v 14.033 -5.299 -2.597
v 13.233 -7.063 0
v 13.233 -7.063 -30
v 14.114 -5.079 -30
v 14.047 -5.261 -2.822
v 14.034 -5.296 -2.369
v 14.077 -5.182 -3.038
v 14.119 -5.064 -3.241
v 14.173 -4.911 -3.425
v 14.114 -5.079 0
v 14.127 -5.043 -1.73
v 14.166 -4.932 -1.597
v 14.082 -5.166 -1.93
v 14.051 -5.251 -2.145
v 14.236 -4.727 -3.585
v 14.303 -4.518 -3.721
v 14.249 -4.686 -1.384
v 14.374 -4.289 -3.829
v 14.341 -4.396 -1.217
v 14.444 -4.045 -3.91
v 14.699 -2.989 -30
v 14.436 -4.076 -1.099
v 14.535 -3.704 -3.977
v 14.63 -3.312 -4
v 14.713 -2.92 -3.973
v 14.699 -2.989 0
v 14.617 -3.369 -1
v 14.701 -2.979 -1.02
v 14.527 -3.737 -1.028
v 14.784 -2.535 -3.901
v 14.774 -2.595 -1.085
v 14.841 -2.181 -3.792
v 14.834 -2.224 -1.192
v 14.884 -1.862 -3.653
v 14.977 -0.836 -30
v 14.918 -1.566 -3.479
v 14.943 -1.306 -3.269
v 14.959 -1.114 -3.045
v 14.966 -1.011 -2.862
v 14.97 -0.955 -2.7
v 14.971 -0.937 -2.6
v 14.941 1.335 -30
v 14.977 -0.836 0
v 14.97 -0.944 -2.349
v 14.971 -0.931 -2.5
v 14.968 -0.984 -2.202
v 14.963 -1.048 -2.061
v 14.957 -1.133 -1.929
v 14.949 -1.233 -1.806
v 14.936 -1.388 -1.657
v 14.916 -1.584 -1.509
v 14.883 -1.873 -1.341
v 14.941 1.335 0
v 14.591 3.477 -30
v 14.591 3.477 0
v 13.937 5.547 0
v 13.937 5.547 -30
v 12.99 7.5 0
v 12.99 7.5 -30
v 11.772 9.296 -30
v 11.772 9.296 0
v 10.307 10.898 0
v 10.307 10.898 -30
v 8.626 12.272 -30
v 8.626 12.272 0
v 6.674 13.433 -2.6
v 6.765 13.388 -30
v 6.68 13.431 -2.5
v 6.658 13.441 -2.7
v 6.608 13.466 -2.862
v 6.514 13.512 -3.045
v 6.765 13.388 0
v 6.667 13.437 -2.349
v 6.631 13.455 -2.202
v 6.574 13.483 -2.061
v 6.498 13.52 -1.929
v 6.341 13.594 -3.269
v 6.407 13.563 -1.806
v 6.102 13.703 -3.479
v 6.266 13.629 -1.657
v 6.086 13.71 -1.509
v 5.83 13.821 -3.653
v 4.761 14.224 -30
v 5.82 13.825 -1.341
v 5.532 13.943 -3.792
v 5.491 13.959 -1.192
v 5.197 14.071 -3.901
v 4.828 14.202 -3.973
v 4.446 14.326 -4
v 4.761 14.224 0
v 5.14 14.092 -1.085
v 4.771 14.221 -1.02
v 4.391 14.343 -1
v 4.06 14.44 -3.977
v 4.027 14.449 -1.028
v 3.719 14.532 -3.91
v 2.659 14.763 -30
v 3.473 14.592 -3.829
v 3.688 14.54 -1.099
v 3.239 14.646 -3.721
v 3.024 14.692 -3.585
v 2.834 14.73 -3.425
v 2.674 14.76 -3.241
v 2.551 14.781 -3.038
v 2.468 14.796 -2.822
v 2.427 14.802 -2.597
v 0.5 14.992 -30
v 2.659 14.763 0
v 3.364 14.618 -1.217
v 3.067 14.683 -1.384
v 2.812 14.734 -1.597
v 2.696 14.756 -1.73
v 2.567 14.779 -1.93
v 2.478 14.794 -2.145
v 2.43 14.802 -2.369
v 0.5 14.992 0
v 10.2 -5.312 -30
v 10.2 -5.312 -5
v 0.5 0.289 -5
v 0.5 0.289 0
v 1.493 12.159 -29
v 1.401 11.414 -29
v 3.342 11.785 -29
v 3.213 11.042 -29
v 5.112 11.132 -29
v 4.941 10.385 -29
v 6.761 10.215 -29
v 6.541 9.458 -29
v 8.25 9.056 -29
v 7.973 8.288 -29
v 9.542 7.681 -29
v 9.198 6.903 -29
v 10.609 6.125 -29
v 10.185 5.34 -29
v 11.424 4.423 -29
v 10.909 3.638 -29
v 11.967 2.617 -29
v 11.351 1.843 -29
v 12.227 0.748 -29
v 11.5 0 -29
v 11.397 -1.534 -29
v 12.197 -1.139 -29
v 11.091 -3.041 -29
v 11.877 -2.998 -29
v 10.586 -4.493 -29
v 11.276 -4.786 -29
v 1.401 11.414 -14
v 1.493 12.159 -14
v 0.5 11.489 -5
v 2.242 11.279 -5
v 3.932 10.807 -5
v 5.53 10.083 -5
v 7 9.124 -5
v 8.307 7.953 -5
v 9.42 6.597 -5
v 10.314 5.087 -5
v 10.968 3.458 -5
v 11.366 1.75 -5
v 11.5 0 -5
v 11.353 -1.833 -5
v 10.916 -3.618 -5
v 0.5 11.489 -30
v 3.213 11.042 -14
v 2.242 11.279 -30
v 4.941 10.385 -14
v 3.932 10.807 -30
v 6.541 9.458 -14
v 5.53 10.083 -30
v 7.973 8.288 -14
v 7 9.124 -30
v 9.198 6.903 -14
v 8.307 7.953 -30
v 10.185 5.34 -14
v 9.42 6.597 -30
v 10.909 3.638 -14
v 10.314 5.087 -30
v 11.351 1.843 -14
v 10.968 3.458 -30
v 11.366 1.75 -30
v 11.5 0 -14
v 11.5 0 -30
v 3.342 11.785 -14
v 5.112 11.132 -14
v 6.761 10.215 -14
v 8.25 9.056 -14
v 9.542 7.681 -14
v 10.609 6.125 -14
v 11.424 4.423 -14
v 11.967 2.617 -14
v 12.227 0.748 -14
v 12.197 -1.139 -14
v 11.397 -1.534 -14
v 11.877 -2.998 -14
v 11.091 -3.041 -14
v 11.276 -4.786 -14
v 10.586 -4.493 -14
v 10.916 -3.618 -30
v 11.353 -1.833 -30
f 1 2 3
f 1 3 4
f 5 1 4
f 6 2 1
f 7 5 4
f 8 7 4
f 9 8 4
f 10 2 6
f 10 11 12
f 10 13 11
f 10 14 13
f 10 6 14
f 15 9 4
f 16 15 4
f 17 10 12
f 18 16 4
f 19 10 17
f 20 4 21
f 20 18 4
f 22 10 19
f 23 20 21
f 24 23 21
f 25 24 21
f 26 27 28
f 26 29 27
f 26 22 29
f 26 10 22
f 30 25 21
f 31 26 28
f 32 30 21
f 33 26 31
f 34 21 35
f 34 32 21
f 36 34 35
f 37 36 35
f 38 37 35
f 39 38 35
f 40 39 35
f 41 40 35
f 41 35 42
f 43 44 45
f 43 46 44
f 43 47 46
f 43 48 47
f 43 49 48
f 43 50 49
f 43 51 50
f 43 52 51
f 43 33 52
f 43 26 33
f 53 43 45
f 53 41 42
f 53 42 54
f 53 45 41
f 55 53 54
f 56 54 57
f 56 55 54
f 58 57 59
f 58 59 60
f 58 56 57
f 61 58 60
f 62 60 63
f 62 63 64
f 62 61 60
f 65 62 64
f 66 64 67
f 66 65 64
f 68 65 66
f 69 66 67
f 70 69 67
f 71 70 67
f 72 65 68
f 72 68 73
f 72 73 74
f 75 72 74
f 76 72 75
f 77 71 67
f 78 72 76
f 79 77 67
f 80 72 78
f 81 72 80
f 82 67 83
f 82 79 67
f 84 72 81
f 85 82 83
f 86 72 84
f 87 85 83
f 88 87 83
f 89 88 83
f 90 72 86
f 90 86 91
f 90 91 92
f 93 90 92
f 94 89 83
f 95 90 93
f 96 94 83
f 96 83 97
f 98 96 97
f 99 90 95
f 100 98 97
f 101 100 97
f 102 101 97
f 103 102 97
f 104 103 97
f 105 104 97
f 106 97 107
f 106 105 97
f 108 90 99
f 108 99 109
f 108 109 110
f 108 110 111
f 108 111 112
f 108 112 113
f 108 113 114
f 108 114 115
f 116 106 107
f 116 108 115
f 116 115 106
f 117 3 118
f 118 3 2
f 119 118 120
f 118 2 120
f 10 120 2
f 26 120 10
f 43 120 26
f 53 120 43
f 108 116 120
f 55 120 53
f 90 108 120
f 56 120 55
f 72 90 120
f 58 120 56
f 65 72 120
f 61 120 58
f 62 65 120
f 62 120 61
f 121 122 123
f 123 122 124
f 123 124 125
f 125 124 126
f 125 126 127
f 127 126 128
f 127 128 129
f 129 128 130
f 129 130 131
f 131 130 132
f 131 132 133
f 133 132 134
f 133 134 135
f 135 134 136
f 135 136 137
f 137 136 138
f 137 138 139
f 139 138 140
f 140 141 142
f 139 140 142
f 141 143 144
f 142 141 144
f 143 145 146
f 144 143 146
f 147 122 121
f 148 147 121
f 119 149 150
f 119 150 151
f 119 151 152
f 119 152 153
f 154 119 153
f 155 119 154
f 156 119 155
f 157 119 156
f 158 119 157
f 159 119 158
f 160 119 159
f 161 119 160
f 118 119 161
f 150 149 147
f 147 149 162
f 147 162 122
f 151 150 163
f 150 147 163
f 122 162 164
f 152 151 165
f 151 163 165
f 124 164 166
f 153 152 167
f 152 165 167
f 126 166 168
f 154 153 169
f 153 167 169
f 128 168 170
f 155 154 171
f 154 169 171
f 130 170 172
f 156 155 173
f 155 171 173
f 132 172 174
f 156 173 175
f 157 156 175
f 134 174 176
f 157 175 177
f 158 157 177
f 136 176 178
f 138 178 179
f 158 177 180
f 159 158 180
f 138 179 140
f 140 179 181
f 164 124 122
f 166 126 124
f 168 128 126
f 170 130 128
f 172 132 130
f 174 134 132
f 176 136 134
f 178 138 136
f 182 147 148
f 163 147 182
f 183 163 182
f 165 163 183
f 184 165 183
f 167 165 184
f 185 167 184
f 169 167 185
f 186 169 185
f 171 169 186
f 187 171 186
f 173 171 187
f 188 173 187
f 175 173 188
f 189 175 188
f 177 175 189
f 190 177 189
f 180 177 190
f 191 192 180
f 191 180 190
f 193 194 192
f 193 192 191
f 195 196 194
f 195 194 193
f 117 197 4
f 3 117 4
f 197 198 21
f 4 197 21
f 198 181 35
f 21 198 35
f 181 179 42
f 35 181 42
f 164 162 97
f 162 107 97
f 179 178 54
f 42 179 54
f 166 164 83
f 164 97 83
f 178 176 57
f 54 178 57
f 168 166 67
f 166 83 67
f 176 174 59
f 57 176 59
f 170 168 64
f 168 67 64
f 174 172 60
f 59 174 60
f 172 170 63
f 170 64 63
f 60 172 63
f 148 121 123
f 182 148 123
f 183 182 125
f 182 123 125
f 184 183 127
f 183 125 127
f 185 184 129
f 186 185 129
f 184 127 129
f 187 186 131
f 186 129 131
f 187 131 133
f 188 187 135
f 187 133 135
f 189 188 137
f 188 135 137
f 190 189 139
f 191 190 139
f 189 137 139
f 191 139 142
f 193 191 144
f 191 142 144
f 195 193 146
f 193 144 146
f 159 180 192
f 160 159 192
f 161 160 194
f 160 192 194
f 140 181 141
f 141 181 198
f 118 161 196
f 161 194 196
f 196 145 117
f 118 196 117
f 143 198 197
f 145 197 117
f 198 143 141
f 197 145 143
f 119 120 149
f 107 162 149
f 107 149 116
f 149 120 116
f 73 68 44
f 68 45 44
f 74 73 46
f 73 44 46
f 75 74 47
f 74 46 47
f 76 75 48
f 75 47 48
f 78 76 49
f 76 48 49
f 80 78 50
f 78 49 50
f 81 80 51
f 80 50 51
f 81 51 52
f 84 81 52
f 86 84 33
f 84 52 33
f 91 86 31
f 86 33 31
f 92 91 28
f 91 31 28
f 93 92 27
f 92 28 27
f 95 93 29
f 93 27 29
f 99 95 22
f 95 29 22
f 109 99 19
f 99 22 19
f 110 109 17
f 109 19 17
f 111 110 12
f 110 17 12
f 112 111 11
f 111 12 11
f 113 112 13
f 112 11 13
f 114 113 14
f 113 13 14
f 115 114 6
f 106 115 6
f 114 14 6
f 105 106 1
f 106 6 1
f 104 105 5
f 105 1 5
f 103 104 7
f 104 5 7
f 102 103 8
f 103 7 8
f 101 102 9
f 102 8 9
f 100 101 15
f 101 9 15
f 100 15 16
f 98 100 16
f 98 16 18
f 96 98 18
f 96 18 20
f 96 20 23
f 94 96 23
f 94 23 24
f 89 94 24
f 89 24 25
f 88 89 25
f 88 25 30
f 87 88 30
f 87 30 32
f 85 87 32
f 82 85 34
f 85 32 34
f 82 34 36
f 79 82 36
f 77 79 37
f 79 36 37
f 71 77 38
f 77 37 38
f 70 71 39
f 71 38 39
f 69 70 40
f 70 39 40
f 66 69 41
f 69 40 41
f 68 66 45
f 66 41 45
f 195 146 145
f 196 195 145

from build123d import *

# Parameters (mm, degrees)
F1_DEPTH  = 30
F3_DEPTH  = 25
F5_R      = 1.5
F6_DEPTH  = 13.5
F8_DEPTH  = 30
F11_DEPTH = 15


with BuildPart() as f1:
    # F0 (on Top) → F1 (new body)
    with BuildSketch(Plane.XY):
        with BuildLine():
            Line((0, 0), (12.9903810568, -7.5))
            ThreePointArc((12.9903810568, -7.5), (12.9903810568, 7.5), (0, 15))
            Line((0, 15), (0, 0))
        make_face()
    extrude(amount=-F1_DEPTH)

    # F2 (on face) → F3 (cut)
    with BuildSketch(Plane(origin=(0, 0, -30), x_dir=(1, 0, 0), z_dir=(0, 0, -1))):
        with BuildLine():
            Line((0, 0), (9.9592921435, 5.75))
            ThreePointArc((9.9592921435, 5.75), (-9.9592921435, 5.75), (0, -11.5))
            Line((0, -11.5), (0, 0))
        make_face()
        with BuildLine():
            ThreePointArc((0, -11.5), (8.1317279836, -8.1317279836), (11.5, 0))
            ThreePointArc((11.5, 0), (11.1081470023, 2.9764190187), (9.9592921435, 5.75))
            Line((9.9592921435, 5.75), (0, 0))
            Line((0, 0), (0, -11.5))
        make_face()
    extrude(amount=-F3_DEPTH, mode=Mode.SUBTRACT)

    # F5 (on face) → F6 (cut, symmetric)
    with BuildSketch(Plane(origin=(0, 0, 0), x_dir=(0.8660254038, 0.5, 0), z_dir=(0.5, -0.8660254038, 0))):
        with Locations((11, -2.5)):
            Circle(F5_R)
    extrude(amount=F6_DEPTH, both=True, mode=Mode.SUBTRACT)

    # F7 (on face) → F8 (cut)
    with BuildSketch(Plane.XY):
        with BuildLine():
            ThreePointArc((0, 15), (0.2500347391, 14.9979159429), (0.5, 14.9916643506))
            Line((0.5, 14.9916643506), (0.5, 16.4106432348))
            Line((0.5, 16.4106432348), (-0.9136777371, 16.4106432348))
            Line((-0.9136777371, 16.4106432348), (-0.9136777371, -10.8329579234))
            Line((-0.9136777371, -10.8329579234), (14.0083907078, -10.8329579234))
            Line((14.0083907078, -10.8329579234), (14.0083907078, -7.5103978769))
            Line((14.0083907078, -7.5103978769), (13.2331621726, -7.0628194734))
            ThreePointArc((13.2331621726, -7.0628194734), (13.1135935799, -7.2824215355), (12.9903810568, -7.5))
            Line((12.9903810568, -7.5), (0, 0))
            Line((0, 0), (0, 15))
        make_face()
        with BuildLine():
            Line((13.2331621726, -7.0628194734), (0.5, 0.2886751346))
            Line((0.5, 0.2886751346), (0.5, 14.9916643506))
            ThreePointArc((0.5, 14.9916643506), (0.2500347391, 14.9979159429), (0, 15))
            Line((0, 15), (0, 0))
            Line((0, 0), (12.9903810568, -7.5))
            ThreePointArc((12.9903810568, -7.5), (13.1135935799, -7.2824215355), (13.2331621726, -7.0628194734))
        make_face()
    extrude(amount=-F8_DEPTH, mode=Mode.SUBTRACT)

    # F10 (on offset) → F11 (cut)
    with BuildSketch(Plane(origin=(0, 0, -29), x_dir=(1, 0, 0), z_dir=(0, 0, -1))):
        with BuildLine():
            ThreePointArc((9.2050485345, 3.9073112849), (8.6602540378, -5), (1.2186934341, -9.9254615164))
            Line((1.2186934341, -9.9254615164), (1.4928994567, -12.1586903576))
            ThreePointArc((1.4928994567, -12.1586903576), (10.6088111964, -6.125), (11.2761844548, 4.786456324))
            Line((11.2761844548, 4.786456324), (9.2050485345, 3.9073112849))
        make_face()
    extrude(amount=-F11_DEPTH, mode=Mode.SUBTRACT)


solid = f1.part
